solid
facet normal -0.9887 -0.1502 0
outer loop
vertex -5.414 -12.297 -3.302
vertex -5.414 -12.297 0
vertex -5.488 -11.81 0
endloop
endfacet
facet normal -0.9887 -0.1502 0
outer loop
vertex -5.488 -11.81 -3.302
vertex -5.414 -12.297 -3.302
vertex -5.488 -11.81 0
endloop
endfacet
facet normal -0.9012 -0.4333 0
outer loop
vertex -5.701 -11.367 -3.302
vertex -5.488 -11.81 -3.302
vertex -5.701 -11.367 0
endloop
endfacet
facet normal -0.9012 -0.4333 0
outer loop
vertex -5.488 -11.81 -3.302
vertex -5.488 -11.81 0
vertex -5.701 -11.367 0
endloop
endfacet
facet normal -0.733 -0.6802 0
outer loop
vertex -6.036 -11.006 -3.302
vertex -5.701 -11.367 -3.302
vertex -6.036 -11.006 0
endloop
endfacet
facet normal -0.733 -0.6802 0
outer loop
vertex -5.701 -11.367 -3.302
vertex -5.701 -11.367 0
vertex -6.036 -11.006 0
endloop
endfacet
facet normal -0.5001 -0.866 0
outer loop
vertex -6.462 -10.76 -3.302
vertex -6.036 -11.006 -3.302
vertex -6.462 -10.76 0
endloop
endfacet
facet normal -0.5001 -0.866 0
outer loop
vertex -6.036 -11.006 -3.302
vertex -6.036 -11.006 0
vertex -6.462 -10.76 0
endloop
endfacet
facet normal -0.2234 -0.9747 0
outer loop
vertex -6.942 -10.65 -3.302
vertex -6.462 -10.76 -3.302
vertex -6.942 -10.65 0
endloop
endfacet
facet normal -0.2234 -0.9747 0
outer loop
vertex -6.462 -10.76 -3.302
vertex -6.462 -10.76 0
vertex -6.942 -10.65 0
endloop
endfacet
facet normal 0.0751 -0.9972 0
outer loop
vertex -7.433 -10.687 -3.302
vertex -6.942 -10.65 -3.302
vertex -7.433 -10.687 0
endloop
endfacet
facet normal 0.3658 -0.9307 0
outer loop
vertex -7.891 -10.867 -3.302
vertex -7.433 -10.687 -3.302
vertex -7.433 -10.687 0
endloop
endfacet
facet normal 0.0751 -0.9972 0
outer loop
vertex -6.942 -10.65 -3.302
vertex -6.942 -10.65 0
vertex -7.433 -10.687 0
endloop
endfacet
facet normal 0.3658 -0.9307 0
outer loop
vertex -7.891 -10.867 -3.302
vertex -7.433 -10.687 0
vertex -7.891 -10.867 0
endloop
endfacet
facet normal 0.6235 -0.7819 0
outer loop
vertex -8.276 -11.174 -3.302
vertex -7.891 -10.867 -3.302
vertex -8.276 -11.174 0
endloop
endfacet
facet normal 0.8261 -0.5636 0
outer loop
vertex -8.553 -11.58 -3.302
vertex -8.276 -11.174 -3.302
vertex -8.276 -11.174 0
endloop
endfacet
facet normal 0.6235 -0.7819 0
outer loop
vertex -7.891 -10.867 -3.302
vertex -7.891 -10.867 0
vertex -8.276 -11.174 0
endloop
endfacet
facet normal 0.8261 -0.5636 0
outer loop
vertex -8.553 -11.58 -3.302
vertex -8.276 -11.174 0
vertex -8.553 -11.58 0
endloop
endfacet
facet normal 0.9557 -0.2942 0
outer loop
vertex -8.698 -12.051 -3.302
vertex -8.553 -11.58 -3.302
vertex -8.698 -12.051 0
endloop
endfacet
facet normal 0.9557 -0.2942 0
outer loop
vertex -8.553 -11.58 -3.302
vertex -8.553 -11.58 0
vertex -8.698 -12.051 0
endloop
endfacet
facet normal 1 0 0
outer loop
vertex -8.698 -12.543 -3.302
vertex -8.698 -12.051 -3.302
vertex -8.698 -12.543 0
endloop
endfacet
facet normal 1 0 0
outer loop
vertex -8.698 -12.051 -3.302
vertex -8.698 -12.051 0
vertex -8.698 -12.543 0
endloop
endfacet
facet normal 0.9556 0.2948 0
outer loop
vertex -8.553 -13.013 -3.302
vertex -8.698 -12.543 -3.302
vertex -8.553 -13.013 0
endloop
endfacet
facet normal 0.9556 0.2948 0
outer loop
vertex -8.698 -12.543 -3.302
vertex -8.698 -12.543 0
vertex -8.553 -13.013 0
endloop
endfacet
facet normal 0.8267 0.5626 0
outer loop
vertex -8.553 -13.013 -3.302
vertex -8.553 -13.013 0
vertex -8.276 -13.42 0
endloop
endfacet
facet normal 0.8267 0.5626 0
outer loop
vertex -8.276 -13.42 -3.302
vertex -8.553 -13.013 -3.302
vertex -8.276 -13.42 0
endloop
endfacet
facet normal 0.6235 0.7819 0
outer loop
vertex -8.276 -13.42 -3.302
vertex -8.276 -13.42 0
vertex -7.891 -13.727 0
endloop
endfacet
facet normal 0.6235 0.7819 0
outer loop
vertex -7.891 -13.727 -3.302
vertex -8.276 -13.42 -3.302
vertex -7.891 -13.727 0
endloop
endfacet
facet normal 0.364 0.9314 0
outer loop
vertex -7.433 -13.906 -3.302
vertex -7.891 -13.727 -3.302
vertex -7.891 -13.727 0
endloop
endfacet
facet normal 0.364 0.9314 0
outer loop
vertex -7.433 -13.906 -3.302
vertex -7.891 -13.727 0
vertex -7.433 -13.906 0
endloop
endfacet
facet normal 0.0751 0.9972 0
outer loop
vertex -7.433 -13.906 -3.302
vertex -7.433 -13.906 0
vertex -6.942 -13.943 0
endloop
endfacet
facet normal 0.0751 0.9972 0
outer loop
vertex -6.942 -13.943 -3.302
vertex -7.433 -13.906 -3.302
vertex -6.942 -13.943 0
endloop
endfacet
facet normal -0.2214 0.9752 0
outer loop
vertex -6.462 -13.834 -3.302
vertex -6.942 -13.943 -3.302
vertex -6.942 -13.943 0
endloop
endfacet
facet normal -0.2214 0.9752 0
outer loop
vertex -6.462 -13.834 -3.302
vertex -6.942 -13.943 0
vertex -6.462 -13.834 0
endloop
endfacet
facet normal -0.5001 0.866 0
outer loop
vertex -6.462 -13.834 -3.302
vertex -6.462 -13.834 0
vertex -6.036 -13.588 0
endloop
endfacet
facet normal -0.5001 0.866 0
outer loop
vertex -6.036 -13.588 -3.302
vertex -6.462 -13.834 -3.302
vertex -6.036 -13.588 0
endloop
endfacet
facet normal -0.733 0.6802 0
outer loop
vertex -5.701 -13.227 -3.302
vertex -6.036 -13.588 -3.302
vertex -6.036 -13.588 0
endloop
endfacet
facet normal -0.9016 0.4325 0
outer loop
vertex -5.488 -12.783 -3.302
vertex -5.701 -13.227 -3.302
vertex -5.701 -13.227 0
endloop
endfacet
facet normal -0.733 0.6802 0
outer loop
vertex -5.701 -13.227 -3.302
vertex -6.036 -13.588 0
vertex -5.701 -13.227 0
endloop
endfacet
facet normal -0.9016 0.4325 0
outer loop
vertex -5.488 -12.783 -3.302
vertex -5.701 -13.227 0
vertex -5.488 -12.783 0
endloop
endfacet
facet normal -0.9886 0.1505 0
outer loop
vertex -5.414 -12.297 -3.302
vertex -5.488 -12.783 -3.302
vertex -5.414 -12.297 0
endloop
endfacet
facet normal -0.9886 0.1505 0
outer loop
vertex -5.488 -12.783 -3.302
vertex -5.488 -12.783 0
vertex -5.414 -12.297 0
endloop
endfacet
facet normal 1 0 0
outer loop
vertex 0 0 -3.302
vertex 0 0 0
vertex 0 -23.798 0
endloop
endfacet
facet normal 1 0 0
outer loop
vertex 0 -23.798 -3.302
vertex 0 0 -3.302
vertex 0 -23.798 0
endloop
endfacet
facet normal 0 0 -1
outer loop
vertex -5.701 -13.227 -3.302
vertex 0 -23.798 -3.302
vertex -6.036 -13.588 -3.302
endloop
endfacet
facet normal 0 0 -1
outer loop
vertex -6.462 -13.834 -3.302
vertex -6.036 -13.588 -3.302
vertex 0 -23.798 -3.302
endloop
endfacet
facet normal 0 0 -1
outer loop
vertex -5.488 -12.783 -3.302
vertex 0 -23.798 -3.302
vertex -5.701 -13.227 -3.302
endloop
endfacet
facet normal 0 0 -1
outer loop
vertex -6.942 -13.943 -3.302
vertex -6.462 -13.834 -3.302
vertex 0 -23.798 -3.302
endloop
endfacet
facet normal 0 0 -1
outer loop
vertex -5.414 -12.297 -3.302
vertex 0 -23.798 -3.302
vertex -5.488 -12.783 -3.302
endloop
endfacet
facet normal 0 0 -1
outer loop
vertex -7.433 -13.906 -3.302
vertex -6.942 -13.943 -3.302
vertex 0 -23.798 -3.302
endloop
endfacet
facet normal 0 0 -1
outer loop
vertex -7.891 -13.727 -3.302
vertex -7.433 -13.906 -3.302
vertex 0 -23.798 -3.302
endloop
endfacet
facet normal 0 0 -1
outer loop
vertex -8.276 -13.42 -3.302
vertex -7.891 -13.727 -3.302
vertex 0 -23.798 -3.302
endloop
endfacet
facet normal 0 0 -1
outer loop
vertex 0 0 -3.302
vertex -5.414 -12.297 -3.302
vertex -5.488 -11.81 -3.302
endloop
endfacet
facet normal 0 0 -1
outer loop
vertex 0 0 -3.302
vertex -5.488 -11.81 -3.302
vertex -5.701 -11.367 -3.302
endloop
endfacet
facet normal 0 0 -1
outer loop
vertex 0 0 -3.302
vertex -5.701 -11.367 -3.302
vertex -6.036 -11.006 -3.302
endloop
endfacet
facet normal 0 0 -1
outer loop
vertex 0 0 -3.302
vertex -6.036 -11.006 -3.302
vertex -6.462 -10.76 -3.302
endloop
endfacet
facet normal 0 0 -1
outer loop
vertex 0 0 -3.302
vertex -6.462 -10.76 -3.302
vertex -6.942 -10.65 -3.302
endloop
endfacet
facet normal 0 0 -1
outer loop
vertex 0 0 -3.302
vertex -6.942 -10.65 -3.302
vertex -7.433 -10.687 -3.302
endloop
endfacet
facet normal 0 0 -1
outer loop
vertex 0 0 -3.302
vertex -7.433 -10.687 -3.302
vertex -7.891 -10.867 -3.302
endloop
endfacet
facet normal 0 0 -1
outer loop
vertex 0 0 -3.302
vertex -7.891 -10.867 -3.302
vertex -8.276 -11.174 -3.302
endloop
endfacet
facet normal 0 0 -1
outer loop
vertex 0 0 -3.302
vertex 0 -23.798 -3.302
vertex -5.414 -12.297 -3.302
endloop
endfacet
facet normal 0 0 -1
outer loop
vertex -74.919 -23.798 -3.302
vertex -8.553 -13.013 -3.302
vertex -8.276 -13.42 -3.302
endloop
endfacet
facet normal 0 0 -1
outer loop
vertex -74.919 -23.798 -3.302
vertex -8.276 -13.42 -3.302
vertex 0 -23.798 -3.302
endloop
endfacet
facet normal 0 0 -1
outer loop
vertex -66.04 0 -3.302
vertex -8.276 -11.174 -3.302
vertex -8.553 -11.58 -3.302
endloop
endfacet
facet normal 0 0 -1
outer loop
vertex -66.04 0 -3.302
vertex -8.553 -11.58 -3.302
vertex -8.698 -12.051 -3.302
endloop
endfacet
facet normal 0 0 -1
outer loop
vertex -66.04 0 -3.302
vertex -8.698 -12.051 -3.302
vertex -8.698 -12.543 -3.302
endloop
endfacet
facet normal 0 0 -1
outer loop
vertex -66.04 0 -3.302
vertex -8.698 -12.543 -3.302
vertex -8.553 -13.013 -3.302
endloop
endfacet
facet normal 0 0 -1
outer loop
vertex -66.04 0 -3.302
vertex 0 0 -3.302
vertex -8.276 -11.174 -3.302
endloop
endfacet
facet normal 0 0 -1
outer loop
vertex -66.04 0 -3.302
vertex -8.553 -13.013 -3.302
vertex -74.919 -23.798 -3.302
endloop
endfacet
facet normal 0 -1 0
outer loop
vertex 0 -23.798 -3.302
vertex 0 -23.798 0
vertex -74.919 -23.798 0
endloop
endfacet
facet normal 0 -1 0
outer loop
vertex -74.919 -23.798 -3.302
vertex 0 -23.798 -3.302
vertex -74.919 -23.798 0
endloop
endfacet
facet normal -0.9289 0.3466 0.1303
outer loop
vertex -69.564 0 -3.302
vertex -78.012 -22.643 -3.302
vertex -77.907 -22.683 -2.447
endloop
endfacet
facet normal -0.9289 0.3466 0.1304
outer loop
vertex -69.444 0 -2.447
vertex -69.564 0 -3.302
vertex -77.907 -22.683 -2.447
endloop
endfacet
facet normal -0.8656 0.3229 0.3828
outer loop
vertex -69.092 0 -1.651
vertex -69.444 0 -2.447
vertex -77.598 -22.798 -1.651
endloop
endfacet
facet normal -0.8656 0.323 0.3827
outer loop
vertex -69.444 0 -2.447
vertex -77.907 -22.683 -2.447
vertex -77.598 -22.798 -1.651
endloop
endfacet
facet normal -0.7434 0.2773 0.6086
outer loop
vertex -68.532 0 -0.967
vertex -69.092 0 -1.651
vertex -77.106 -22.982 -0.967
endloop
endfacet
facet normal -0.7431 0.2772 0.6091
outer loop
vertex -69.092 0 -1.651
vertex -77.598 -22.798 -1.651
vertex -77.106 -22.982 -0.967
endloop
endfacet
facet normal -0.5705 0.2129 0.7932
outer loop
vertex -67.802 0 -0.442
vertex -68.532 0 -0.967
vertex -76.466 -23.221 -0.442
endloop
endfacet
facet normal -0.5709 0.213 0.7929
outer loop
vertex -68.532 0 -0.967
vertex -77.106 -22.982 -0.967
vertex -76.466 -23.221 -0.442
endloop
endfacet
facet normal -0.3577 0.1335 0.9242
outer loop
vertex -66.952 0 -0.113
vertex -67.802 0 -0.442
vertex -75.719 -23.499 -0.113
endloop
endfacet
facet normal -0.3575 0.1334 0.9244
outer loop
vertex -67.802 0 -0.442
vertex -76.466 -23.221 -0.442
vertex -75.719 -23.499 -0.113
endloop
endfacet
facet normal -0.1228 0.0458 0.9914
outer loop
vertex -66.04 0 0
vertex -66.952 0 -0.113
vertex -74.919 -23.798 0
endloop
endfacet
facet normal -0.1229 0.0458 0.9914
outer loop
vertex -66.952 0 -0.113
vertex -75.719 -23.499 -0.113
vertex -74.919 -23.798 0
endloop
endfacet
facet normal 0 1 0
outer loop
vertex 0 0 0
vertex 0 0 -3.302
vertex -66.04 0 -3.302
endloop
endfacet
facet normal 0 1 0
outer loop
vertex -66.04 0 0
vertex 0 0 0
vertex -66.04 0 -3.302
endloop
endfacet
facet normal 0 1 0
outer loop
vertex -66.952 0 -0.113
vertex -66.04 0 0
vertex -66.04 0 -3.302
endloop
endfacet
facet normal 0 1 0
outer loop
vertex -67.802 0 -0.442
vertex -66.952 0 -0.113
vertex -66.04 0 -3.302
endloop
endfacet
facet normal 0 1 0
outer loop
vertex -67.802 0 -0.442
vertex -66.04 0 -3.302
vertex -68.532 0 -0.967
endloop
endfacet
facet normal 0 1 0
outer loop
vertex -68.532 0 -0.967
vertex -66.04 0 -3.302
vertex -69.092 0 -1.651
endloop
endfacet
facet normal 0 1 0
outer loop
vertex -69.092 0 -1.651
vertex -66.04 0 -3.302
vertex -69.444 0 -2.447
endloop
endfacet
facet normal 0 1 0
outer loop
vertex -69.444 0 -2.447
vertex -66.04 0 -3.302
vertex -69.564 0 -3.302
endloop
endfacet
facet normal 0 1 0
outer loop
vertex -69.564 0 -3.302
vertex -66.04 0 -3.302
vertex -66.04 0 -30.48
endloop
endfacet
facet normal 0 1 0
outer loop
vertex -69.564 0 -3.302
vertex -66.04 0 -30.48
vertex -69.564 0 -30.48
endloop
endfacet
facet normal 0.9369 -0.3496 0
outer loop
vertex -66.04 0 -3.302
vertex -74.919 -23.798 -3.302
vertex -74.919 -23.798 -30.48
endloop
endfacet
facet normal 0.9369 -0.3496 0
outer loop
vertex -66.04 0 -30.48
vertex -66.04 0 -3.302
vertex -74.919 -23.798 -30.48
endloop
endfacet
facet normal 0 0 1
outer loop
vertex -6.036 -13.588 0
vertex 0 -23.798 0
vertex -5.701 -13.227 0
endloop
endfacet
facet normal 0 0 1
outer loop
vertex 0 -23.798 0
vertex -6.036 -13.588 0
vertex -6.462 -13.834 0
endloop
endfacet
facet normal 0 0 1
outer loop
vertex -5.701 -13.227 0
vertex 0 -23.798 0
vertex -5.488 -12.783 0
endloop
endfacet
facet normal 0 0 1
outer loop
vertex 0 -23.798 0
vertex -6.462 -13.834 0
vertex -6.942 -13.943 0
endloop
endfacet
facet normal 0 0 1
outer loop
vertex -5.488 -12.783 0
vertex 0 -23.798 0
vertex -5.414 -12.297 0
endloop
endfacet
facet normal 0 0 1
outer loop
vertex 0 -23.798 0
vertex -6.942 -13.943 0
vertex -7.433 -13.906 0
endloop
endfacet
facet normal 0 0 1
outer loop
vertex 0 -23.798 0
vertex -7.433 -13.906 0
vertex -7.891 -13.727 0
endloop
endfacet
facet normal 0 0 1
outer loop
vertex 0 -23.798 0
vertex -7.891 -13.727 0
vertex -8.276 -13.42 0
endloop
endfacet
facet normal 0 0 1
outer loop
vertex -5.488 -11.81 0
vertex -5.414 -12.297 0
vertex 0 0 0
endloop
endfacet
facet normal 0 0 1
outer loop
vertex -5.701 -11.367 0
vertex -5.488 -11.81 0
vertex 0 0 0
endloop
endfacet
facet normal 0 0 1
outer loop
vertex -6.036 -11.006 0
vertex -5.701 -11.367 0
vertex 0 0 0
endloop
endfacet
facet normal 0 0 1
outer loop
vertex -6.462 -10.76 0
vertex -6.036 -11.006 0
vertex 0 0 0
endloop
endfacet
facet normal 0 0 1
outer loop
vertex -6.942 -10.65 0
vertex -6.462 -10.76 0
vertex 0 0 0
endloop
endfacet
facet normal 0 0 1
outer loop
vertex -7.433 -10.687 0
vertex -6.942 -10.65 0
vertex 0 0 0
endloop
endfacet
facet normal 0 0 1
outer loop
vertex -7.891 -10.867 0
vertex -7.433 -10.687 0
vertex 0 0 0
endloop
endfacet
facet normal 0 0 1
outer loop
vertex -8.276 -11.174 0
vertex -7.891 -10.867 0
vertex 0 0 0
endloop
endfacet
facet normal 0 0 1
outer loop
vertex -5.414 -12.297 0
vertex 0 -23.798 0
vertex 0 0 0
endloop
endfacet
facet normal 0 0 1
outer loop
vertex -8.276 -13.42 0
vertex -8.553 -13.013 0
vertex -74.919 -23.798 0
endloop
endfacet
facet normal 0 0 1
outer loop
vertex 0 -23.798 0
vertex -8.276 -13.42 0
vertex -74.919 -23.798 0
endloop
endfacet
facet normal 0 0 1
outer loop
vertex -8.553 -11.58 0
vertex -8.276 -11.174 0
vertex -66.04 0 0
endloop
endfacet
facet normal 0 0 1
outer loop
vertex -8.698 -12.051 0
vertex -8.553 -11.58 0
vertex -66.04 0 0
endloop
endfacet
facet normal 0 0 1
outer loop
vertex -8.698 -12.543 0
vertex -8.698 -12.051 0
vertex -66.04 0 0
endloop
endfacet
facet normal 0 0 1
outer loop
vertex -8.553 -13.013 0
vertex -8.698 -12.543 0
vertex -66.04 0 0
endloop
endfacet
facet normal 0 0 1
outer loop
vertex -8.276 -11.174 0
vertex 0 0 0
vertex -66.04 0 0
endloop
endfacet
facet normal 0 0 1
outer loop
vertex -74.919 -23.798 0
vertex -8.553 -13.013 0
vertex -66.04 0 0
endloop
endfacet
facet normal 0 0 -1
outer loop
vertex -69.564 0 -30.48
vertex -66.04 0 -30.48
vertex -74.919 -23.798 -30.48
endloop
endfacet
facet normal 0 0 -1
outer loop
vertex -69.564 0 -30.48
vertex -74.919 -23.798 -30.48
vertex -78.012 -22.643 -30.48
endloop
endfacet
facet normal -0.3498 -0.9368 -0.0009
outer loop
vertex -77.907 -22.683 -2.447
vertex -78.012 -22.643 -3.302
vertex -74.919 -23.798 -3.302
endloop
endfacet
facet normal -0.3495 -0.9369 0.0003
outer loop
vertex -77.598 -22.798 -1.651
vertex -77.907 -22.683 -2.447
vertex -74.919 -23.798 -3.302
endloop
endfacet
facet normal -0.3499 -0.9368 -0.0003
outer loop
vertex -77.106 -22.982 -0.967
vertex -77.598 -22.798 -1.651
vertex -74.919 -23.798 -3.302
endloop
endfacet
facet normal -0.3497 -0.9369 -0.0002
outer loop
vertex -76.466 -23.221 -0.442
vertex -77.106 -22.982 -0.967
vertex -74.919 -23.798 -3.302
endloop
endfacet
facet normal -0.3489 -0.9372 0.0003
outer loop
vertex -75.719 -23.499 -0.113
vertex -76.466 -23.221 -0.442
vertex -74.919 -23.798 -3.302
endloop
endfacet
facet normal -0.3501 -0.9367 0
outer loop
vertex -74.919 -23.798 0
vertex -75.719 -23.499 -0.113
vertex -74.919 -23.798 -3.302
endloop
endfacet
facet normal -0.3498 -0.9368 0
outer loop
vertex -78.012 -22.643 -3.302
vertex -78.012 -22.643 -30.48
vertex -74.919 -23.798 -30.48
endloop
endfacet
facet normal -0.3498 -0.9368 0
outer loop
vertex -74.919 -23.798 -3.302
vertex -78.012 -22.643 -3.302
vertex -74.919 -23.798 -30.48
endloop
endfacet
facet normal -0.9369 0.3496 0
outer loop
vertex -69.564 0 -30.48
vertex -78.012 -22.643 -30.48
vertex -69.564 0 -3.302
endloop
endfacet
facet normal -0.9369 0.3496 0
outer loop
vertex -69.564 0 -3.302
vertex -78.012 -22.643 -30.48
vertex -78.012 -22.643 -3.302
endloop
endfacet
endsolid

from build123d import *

# Parameters (mm, degrees)
SKETCH13_R              = 1.651
BASE_FLANGE5_DEPTH      = 3.302
EDGE_FLANGE4_START      = -48.484504913
EDGE_FLANGE4_DEPTH      = 25.4
CUT_EXTRUDE4_DEPTH      = 4.699
CUT_EXTRUDE4_DEPTH_BACK = 36.068


# Read off the part's stored shape, not the designer's step: Edge-Flange4
# Sheet-metal steps are written as plain solids
with BuildPart() as part:
    # Sketch13 → Base-Flange5 (new body)
    with BuildSketch(Plane.XY):
        Polygon((-66.04, 0), (0, 0), (0, -23.797677877), (-74.918655736, -23.797677877), align=None)
        with Locations((-7.065339848, -12.296727665)):
            Circle(SKETCH13_R, mode=Mode.SUBTRACT)
    extrude(amount=-BASE_FLANGE5_DEPTH)

    # Edge-Flange4 outline → Edge-Flange4 (add)
    with BuildSketch(Plane(origin=(0, 0, 0), x_dir=(0.9369164518419233, -0.34955337542060905, 0), z_dir=(0.34955337542060905, 0.9369164518419232, 0)).offset(EDGE_FLANGE4_START)):
        with BuildLine():
            ThreePointArc((-65.17596248, 3.302), (-64.208829071, 0.967133409), (-61.87396248, 0))
            Line((-61.87396248, 0), (-61.87396248, 30.48))
            Line((-61.87396248, 30.48), (-65.17596248, 30.48))
            Line((-65.17596248, 30.48), (-65.17596248, 3.302))
        make_face()
    extrude(amount=EDGE_FLANGE4_DEPTH)

    # Sketch51 → Cut-Extrude4 (cut, two sides: drawn at the far end of the back side and taken through both)
    with BuildSketch(Plane.XY.offset(-CUT_EXTRUDE4_DEPTH_BACK)):
        Polygon((-66.04, 0), (-69.564327056, 0), (-69.133698124, 1.154225246), align=None)
    extrude(amount=CUT_EXTRUDE4_DEPTH + CUT_EXTRUDE4_DEPTH_BACK, mode=Mode.SUBTRACT)


solid = part.part
